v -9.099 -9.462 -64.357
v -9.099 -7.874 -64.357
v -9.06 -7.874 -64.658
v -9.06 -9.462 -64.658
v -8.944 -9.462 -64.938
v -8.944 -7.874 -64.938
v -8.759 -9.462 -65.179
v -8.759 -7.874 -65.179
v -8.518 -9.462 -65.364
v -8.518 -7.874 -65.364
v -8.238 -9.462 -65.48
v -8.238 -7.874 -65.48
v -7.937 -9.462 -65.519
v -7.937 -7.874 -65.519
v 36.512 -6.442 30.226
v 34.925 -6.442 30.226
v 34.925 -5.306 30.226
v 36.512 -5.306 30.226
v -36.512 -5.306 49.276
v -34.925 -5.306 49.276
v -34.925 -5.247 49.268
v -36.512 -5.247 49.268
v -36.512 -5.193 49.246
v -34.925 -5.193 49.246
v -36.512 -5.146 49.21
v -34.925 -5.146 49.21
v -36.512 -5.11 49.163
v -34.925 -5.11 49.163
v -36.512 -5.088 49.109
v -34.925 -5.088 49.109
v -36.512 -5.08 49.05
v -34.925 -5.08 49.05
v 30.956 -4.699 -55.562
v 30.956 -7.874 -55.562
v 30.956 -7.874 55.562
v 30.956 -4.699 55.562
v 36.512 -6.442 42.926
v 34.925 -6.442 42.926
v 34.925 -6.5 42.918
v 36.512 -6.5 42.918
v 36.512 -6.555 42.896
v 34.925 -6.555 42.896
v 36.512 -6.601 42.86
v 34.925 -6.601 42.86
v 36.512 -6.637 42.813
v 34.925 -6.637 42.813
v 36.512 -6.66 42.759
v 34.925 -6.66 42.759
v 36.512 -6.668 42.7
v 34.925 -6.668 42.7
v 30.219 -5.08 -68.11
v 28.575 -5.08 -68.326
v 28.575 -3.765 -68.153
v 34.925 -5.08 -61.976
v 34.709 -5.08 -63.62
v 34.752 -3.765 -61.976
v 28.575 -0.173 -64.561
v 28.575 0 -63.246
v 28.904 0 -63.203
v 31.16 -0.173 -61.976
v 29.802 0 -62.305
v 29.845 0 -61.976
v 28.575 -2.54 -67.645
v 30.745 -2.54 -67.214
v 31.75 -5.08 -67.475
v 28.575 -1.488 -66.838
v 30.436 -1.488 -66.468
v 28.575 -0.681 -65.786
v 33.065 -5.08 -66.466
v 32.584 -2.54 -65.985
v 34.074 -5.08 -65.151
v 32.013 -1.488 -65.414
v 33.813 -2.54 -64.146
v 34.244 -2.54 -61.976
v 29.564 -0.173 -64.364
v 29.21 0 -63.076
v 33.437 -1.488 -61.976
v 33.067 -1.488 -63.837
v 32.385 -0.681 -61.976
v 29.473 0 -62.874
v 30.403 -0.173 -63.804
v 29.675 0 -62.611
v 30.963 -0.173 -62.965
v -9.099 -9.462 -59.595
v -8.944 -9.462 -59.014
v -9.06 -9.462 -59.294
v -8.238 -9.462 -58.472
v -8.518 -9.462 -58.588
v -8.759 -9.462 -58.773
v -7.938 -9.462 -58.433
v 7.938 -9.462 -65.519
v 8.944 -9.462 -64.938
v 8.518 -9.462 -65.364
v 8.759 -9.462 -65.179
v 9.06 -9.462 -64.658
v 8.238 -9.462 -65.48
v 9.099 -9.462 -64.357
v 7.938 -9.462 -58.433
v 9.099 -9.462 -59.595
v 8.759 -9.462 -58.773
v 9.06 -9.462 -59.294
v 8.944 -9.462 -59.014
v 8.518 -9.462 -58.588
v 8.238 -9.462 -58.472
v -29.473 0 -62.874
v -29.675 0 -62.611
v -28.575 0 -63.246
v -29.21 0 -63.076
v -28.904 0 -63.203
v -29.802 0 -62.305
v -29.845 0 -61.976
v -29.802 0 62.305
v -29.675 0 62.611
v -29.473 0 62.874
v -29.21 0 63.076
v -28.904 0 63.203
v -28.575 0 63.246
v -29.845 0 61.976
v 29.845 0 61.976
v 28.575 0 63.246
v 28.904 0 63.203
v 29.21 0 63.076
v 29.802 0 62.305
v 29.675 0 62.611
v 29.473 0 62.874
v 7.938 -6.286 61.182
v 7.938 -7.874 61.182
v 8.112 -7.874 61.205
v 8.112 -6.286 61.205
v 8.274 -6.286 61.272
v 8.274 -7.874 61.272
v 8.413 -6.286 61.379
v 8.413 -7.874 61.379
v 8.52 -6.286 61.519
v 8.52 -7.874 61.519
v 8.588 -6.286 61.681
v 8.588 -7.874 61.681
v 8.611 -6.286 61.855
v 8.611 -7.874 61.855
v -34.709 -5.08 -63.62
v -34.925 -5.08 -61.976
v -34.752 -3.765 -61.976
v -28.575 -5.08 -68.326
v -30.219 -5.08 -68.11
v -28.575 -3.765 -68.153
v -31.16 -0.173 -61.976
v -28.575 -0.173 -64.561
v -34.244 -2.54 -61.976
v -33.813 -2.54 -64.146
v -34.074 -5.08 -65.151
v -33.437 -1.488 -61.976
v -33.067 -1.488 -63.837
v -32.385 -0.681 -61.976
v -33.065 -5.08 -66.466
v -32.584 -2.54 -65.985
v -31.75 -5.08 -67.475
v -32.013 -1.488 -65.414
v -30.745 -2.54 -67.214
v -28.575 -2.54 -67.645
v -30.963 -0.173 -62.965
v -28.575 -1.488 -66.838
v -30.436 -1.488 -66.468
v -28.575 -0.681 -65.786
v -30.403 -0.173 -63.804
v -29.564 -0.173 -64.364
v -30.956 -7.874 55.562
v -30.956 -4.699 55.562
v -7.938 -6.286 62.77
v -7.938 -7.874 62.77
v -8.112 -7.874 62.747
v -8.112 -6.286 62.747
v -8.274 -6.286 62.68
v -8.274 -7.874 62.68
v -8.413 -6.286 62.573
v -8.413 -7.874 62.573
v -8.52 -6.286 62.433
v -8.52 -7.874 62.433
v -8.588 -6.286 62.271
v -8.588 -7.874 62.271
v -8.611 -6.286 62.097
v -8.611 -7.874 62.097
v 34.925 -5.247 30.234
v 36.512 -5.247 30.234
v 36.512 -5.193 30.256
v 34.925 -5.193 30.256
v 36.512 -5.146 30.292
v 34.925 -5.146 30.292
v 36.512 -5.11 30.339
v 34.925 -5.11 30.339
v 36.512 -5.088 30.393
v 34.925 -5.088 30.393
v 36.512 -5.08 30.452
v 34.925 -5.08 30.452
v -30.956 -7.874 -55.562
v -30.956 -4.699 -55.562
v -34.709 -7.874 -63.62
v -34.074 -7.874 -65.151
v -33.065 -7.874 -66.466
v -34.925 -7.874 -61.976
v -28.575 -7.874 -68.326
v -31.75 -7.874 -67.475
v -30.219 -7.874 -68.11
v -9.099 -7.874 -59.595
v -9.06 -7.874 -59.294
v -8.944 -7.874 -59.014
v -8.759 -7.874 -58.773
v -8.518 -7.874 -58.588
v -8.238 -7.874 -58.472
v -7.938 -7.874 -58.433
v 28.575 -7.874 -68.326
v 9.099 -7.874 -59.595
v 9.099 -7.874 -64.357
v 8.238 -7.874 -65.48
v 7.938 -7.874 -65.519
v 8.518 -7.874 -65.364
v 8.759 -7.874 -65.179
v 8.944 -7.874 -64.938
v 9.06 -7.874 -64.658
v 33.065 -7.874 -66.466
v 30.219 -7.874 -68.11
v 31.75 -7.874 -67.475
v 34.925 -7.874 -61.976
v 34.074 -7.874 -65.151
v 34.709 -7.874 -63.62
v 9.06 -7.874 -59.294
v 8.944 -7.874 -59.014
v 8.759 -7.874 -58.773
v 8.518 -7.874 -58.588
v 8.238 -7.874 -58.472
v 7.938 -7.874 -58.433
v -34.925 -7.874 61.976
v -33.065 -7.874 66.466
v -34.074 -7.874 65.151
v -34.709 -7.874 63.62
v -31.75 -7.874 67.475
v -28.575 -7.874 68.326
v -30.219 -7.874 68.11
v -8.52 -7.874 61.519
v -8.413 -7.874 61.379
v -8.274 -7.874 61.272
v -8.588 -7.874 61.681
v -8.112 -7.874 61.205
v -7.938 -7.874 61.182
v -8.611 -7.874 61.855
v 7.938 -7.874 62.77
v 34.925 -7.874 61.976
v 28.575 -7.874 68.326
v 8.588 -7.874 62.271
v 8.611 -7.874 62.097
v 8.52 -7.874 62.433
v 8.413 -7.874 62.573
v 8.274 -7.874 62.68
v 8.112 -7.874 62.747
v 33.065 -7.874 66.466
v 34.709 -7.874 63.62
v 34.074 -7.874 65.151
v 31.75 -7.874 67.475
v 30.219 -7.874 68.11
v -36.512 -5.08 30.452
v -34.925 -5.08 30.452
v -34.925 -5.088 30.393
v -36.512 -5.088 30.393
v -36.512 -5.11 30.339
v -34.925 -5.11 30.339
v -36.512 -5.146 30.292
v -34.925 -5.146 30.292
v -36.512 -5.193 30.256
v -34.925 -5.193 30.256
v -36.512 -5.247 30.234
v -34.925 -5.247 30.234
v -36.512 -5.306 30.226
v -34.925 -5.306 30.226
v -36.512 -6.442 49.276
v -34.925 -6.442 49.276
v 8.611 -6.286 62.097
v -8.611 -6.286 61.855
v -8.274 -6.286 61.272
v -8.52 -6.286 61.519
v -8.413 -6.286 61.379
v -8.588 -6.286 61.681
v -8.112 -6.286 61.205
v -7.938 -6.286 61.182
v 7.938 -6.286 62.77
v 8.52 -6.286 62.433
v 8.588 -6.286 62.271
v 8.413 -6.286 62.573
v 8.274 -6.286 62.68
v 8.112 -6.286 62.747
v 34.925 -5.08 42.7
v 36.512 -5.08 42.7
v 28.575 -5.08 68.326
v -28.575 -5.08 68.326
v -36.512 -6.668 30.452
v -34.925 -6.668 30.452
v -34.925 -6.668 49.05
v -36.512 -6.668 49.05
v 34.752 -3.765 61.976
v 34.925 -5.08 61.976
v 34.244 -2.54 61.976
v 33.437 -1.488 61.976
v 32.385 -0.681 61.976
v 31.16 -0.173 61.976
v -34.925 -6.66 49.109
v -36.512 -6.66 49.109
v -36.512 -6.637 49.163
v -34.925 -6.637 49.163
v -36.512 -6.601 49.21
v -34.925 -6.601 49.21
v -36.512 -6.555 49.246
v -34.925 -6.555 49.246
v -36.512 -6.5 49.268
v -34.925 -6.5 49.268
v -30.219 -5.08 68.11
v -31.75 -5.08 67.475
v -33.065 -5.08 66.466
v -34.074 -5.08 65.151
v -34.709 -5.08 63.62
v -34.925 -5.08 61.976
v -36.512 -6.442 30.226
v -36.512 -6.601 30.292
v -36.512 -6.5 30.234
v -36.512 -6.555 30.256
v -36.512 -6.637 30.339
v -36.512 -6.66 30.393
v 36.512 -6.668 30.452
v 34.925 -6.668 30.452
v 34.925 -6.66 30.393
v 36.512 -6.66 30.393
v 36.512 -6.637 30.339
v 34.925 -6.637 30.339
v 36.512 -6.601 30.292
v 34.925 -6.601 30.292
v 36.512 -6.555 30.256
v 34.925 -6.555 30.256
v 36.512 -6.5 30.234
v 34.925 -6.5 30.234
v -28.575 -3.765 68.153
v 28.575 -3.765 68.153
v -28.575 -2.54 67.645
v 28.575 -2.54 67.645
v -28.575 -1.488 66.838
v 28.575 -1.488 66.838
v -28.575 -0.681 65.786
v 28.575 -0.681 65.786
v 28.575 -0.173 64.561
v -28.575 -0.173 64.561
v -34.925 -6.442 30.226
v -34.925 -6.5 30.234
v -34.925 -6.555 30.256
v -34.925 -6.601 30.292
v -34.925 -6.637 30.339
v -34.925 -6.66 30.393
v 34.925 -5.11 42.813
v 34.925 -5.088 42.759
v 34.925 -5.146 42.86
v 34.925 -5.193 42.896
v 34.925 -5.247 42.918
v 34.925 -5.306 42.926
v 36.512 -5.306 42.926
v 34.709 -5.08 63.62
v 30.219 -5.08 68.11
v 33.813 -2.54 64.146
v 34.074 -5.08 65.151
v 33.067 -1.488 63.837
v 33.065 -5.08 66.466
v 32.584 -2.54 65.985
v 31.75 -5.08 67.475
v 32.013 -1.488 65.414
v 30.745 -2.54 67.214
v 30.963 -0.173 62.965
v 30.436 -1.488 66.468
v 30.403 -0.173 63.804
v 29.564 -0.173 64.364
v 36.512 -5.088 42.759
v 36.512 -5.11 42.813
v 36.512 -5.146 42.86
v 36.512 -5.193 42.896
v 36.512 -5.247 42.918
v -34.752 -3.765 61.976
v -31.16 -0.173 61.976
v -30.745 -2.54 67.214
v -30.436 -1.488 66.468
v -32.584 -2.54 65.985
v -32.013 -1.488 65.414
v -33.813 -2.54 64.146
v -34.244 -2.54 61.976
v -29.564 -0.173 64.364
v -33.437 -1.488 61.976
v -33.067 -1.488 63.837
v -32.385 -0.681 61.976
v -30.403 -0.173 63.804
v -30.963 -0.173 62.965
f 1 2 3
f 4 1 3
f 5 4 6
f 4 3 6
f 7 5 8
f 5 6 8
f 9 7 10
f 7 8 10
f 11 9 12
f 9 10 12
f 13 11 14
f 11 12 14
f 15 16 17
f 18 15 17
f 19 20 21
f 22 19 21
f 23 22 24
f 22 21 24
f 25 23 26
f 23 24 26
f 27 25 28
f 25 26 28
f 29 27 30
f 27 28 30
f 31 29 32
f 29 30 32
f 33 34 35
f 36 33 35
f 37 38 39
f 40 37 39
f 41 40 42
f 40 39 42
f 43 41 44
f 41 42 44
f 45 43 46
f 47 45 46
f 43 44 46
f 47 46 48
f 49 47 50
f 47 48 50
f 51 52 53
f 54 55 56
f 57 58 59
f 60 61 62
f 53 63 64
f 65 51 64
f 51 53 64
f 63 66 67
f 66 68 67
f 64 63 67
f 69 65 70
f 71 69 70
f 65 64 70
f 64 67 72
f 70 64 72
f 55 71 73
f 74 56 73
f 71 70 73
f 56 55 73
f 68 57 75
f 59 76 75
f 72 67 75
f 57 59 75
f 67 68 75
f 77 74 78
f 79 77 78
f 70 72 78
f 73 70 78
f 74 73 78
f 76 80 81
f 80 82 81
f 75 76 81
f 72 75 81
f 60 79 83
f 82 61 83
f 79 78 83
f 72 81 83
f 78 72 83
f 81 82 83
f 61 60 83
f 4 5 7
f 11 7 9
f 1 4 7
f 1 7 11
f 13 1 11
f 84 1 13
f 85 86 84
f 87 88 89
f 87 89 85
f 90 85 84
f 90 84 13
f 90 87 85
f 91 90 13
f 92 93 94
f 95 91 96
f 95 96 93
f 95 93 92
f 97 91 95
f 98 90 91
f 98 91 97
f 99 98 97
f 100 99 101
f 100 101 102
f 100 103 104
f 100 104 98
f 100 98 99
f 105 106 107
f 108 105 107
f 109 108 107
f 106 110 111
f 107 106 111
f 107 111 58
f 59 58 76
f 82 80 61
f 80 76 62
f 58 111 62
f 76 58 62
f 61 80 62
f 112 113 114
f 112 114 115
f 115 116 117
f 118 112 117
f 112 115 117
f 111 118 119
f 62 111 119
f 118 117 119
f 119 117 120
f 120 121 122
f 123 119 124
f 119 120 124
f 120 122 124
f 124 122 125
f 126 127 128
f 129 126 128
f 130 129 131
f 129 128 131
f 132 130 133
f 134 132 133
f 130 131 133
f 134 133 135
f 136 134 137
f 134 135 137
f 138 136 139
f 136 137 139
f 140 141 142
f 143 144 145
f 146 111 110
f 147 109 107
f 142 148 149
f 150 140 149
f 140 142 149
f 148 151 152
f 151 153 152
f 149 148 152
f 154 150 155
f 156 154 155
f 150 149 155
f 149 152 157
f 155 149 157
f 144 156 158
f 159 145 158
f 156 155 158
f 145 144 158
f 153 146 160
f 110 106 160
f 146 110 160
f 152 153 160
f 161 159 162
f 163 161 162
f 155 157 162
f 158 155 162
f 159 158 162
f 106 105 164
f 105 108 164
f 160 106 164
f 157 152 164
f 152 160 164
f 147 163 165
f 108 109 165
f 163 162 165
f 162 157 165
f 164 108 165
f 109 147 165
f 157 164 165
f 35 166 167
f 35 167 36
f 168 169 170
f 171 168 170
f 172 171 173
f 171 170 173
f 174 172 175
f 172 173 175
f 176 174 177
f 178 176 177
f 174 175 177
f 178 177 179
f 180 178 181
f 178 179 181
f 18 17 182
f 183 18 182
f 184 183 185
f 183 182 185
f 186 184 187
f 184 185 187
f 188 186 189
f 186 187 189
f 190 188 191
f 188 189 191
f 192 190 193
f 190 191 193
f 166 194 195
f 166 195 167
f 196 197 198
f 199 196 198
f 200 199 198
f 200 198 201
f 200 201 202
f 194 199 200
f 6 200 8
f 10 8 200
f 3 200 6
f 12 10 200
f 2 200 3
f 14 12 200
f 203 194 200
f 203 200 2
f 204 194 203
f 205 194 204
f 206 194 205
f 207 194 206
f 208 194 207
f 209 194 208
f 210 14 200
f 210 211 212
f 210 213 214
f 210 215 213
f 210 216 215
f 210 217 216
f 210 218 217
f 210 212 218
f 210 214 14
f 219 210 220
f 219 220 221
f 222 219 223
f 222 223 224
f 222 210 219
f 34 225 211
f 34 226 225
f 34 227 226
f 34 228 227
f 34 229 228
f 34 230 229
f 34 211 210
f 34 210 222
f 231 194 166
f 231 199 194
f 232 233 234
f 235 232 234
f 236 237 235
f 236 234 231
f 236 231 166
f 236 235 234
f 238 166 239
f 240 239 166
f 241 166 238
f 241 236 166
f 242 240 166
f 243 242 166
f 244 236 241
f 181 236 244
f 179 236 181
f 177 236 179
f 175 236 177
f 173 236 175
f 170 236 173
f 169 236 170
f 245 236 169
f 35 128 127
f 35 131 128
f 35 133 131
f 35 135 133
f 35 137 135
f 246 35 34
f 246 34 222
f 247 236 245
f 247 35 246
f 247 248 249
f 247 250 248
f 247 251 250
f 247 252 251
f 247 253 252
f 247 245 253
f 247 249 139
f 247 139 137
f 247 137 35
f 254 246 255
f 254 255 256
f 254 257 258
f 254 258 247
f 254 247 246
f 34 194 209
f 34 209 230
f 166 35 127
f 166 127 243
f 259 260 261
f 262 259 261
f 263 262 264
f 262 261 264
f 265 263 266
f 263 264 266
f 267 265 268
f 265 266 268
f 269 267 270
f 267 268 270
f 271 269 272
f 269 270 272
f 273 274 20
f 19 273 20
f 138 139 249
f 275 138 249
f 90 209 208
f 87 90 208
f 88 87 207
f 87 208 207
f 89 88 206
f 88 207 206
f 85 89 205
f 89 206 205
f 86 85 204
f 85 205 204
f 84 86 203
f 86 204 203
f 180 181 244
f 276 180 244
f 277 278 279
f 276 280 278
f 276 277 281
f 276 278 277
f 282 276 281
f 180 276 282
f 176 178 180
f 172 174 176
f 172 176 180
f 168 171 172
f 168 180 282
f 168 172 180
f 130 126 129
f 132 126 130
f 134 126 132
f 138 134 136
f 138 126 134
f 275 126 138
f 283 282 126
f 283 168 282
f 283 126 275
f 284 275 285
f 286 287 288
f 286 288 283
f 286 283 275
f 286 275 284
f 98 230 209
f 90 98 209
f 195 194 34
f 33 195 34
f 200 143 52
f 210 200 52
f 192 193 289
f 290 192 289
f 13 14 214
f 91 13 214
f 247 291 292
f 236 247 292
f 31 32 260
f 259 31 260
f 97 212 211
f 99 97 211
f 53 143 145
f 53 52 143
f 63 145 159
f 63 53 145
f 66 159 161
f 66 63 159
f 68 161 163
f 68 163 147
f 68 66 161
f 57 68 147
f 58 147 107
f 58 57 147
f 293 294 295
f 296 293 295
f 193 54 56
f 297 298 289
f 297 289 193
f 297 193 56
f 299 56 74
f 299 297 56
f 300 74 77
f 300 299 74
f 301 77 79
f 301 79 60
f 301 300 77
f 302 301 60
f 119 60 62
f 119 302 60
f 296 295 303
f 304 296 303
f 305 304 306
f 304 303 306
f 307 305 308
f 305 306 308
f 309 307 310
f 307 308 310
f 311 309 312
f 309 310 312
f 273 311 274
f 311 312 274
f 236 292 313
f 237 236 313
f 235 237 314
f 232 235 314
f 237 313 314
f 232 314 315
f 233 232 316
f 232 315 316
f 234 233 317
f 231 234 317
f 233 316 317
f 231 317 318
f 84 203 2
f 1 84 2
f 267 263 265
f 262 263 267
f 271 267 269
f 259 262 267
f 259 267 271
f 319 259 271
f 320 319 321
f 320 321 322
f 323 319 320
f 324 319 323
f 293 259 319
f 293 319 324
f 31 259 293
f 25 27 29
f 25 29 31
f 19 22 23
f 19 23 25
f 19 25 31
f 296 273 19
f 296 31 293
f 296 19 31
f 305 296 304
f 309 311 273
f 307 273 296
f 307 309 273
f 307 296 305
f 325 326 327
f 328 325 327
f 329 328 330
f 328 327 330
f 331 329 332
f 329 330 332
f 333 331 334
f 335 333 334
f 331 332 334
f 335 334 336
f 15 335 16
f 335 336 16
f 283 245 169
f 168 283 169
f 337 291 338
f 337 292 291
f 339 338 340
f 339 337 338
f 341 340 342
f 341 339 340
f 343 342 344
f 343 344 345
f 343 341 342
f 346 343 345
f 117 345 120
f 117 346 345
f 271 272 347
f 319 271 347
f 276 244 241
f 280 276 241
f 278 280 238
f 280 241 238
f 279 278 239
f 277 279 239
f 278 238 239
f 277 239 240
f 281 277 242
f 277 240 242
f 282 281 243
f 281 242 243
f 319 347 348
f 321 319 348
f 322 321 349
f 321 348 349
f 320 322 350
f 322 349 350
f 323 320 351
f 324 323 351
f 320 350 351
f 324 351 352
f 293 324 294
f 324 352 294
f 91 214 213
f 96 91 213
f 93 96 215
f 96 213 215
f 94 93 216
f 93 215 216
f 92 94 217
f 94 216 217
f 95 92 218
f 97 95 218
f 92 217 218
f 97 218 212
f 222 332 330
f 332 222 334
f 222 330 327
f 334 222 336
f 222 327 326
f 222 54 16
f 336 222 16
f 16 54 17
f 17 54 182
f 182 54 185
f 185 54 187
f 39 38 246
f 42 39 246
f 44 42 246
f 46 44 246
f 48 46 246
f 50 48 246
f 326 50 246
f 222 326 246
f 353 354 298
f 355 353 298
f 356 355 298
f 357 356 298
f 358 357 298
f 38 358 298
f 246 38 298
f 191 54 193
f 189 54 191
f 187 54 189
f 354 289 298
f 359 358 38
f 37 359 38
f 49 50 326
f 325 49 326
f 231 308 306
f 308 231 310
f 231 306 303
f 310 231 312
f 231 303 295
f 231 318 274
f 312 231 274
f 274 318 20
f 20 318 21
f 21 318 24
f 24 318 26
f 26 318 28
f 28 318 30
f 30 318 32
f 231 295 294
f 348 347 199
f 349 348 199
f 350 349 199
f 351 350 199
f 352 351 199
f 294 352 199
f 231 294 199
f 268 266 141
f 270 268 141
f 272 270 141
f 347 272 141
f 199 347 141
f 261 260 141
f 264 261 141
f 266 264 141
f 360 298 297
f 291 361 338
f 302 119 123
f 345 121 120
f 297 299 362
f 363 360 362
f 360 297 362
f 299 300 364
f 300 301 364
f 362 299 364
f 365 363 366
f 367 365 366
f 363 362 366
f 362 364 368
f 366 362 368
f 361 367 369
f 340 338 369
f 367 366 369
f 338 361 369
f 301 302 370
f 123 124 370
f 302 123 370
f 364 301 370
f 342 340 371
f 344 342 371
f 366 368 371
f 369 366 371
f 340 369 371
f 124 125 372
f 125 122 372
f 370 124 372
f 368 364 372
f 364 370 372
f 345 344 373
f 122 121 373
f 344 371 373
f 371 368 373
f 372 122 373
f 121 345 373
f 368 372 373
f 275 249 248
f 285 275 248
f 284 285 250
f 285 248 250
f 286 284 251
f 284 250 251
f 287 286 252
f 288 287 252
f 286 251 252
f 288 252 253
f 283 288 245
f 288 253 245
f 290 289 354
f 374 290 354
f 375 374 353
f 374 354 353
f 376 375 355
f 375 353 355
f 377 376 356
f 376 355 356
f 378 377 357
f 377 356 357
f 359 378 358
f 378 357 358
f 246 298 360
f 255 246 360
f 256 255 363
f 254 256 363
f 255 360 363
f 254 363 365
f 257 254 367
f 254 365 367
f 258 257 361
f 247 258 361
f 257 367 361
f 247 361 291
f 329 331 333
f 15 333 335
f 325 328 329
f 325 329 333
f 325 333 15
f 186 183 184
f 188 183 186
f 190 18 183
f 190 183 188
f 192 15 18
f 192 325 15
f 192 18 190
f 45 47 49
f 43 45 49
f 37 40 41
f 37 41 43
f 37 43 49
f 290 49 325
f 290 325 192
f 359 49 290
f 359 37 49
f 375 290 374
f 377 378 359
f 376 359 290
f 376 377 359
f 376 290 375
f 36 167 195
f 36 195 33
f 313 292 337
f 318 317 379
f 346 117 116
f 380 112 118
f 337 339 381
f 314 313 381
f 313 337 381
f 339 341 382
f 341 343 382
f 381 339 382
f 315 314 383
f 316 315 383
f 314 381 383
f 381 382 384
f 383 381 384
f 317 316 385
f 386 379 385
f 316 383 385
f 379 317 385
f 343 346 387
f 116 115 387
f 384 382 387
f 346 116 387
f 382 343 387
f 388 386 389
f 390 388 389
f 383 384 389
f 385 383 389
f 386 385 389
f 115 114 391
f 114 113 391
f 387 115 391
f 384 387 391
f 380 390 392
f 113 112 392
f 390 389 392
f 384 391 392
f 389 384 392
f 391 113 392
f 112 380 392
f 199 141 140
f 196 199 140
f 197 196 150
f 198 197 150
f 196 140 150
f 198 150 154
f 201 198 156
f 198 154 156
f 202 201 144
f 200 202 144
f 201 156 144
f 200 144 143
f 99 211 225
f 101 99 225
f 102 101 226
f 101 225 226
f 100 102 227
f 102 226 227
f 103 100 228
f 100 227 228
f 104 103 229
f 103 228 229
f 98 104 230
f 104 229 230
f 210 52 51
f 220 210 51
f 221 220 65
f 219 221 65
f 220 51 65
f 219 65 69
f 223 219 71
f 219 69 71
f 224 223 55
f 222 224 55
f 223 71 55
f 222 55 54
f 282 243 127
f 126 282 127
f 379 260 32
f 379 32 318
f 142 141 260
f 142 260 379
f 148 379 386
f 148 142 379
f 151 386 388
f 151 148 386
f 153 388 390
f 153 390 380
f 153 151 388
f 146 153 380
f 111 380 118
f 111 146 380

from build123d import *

# Parameters (mm, degrees)
F1_DEPTH  = 7.874
F2_R      = 5.08
F3_W      = 61.9125
F3_H      = 111.125
F4_DEPTH  = 3.175
F6_DEPTH  = 1.5875
F7_DEPTH  = 1.5875
F9_DEPTH  = 1.5875
F11_DEPTH = 1.5875


# Not quite as in the source:
# - a length typed as a fraction of an inch, garbled in the dataset ("3 / 203.2 mm" for 3/8 in), is restored
# - a feature names something its author has since deleted; it is built from what else it names


with BuildPart() as f1:
    # F0 (on Front) → F1 (new body)
    with BuildSketch(Plane.XZ):
        with BuildLine():
            ThreePointArc((-28.575, 68.326), (-33.0651280605, 66.4661280605), (-34.925, 61.976))
            Line((-34.925, 61.976), (-34.925, -61.976))
            ThreePointArc((-34.925, -61.976), (-33.0651280605, -66.4661280605), (-28.575, -68.326))
            Line((-28.575, -68.326), (28.575, -68.326))
            ThreePointArc((28.575, -68.326), (33.0651280605, -66.4661280605), (34.925, -61.976))
            Line((34.925, -61.976), (34.925, 61.976))
            ThreePointArc((34.925, 61.976), (33.0651280605, 66.4661280605), (28.575, 68.326))
            Line((28.575, 68.326), (-28.575, 68.326))
        make_face()
    extrude(amount=F1_DEPTH)

    # F2
    f2_edges = [f1.edges().sort_by_distance(p)[0] for p in [
        (33.065128, 0, 66.466128),
        (0, 0, 68.326),
        (34.925, 0, 0),
    ]]
    fillet(f2_edges, radius=F2_R)

    # F3 (on face) → F4 (cut)
    with BuildSketch(Plane.XZ.offset(7.874)):
        Rectangle(F3_W, F3_H)
    extrude(amount=-F4_DEPTH, mode=Mode.SUBTRACT)

    # F5 (on face) → F6 (join)
    with BuildSketch(Plane.XZ.offset(7.874)):
        with BuildLine():
            Line((7.9375, -58.4327856867), (-7.9375, -58.4327856867))
            ThreePointArc((-7.9375, -58.4327856867), (-8.7591312506, -58.7731164939), (-9.0994620578, -59.5947477445))
            Line((-9.0994620578, -59.5947477445), (-9.0994620578, -64.3572522555))
            ThreePointArc((-9.0994620578, -64.3572522555), (-8.7591311338, -65.1788836228), (-7.9374996698, -65.5192143133))
            Line((-7.9374996698, -65.5192143133), (7.9375003302, -65.5192098023))
            ThreePointArc((7.9375003302, -65.5192098023), (8.7591313673, -65.1788788783), (9.0994620578, -64.3572477445))
            Line((9.0994620578, -64.3572477445), (9.0994620578, -59.5947477445))
            ThreePointArc((9.0994620578, -59.5947477445), (8.7591312506, -58.7731164939), (7.9375, -58.4327856867))
        make_face()
    extrude(amount=F6_DEPTH)

    # F3 (on face) → F7 (cut)
    with BuildSketch(Plane.XZ.offset(7.874)):
        with BuildLine():
            Line((7.9375, 62.76975), (-7.9375, 62.76975))
            ThreePointArc((-7.9375, 62.76975), (-8.4134535744, 62.5726035744), (-8.6106, 62.09665))
            Line((-8.6106, 62.09665), (-8.6106, 61.85535))
            ThreePointArc((-8.6106, 61.85535), (-8.4134535744, 61.3793964256), (-7.9375, 61.18225))
            Line((-7.9375, 61.18225), (7.9375, 61.18225))
            ThreePointArc((7.9375, 61.18225), (8.4134535744, 61.3793964256), (8.6106, 61.85535))
            Line((8.6106, 61.85535), (8.6106, 62.09665))
            ThreePointArc((8.6106, 62.09665), (8.4134535744, 62.5726035744), (7.9375, 62.76975))
        make_face()
    extrude(amount=-F7_DEPTH, mode=Mode.SUBTRACT)

    # F8 (on face) → F9 (join)
    with BuildSketch(Plane(origin=(-34.925, 0, 0), x_dir=(0, -1, 0), z_dir=(-1, 0, 0))):
        with BuildLine():
            Line((6.6675, 30.4519287544), (6.6675, 49.0500712456))
            ThreePointArc((6.6675, 49.0500712456), (6.601327, 49.209827), (6.4415712456, 49.276))
            Line((6.4415712456, 49.276), (5.3059287544, 49.276))
            ThreePointArc((5.3059287544, 49.276), (5.146173, 49.209827), (5.08, 49.0500712456))
            Line((5.08, 49.0500712456), (5.08, 30.4519287544))
            ThreePointArc((5.08, 30.4519287544), (5.146173, 30.292173), (5.3059287544, 30.226))
            Line((5.3059287544, 30.226), (6.4415712456, 30.226))
            ThreePointArc((6.4415712456, 30.226), (6.601327, 30.292173), (6.6675, 30.4519287544))
        make_face()
    extrude(amount=F9_DEPTH)

    # F10 (on face) → F11 (join)
    with BuildSketch(Plane.YZ.offset(34.925)):
        with BuildLine():
            Line((-5.08, 30.4519287544), (-5.08, 42.7000712456))
            ThreePointArc((-5.08, 42.7000712456), (-5.146173, 42.859827), (-5.3059287544, 42.926))
            Line((-5.3059287544, 42.926), (-6.4415712456, 42.926))
            ThreePointArc((-6.4415712456, 42.926), (-6.601327, 42.859827), (-6.6675, 42.7000712456))
            Line((-6.6675, 42.7000712456), (-6.6675, 30.4519287544))
            ThreePointArc((-6.6675, 30.4519287544), (-6.601327, 30.292173), (-6.4415712456, 30.226))
            Line((-6.4415712456, 30.226), (-5.3059287544, 30.226))
            ThreePointArc((-5.3059287544, 30.226), (-5.146173, 30.292173), (-5.08, 30.4519287544))
        make_face()
    extrude(amount=F11_DEPTH)


solid = f1.part
